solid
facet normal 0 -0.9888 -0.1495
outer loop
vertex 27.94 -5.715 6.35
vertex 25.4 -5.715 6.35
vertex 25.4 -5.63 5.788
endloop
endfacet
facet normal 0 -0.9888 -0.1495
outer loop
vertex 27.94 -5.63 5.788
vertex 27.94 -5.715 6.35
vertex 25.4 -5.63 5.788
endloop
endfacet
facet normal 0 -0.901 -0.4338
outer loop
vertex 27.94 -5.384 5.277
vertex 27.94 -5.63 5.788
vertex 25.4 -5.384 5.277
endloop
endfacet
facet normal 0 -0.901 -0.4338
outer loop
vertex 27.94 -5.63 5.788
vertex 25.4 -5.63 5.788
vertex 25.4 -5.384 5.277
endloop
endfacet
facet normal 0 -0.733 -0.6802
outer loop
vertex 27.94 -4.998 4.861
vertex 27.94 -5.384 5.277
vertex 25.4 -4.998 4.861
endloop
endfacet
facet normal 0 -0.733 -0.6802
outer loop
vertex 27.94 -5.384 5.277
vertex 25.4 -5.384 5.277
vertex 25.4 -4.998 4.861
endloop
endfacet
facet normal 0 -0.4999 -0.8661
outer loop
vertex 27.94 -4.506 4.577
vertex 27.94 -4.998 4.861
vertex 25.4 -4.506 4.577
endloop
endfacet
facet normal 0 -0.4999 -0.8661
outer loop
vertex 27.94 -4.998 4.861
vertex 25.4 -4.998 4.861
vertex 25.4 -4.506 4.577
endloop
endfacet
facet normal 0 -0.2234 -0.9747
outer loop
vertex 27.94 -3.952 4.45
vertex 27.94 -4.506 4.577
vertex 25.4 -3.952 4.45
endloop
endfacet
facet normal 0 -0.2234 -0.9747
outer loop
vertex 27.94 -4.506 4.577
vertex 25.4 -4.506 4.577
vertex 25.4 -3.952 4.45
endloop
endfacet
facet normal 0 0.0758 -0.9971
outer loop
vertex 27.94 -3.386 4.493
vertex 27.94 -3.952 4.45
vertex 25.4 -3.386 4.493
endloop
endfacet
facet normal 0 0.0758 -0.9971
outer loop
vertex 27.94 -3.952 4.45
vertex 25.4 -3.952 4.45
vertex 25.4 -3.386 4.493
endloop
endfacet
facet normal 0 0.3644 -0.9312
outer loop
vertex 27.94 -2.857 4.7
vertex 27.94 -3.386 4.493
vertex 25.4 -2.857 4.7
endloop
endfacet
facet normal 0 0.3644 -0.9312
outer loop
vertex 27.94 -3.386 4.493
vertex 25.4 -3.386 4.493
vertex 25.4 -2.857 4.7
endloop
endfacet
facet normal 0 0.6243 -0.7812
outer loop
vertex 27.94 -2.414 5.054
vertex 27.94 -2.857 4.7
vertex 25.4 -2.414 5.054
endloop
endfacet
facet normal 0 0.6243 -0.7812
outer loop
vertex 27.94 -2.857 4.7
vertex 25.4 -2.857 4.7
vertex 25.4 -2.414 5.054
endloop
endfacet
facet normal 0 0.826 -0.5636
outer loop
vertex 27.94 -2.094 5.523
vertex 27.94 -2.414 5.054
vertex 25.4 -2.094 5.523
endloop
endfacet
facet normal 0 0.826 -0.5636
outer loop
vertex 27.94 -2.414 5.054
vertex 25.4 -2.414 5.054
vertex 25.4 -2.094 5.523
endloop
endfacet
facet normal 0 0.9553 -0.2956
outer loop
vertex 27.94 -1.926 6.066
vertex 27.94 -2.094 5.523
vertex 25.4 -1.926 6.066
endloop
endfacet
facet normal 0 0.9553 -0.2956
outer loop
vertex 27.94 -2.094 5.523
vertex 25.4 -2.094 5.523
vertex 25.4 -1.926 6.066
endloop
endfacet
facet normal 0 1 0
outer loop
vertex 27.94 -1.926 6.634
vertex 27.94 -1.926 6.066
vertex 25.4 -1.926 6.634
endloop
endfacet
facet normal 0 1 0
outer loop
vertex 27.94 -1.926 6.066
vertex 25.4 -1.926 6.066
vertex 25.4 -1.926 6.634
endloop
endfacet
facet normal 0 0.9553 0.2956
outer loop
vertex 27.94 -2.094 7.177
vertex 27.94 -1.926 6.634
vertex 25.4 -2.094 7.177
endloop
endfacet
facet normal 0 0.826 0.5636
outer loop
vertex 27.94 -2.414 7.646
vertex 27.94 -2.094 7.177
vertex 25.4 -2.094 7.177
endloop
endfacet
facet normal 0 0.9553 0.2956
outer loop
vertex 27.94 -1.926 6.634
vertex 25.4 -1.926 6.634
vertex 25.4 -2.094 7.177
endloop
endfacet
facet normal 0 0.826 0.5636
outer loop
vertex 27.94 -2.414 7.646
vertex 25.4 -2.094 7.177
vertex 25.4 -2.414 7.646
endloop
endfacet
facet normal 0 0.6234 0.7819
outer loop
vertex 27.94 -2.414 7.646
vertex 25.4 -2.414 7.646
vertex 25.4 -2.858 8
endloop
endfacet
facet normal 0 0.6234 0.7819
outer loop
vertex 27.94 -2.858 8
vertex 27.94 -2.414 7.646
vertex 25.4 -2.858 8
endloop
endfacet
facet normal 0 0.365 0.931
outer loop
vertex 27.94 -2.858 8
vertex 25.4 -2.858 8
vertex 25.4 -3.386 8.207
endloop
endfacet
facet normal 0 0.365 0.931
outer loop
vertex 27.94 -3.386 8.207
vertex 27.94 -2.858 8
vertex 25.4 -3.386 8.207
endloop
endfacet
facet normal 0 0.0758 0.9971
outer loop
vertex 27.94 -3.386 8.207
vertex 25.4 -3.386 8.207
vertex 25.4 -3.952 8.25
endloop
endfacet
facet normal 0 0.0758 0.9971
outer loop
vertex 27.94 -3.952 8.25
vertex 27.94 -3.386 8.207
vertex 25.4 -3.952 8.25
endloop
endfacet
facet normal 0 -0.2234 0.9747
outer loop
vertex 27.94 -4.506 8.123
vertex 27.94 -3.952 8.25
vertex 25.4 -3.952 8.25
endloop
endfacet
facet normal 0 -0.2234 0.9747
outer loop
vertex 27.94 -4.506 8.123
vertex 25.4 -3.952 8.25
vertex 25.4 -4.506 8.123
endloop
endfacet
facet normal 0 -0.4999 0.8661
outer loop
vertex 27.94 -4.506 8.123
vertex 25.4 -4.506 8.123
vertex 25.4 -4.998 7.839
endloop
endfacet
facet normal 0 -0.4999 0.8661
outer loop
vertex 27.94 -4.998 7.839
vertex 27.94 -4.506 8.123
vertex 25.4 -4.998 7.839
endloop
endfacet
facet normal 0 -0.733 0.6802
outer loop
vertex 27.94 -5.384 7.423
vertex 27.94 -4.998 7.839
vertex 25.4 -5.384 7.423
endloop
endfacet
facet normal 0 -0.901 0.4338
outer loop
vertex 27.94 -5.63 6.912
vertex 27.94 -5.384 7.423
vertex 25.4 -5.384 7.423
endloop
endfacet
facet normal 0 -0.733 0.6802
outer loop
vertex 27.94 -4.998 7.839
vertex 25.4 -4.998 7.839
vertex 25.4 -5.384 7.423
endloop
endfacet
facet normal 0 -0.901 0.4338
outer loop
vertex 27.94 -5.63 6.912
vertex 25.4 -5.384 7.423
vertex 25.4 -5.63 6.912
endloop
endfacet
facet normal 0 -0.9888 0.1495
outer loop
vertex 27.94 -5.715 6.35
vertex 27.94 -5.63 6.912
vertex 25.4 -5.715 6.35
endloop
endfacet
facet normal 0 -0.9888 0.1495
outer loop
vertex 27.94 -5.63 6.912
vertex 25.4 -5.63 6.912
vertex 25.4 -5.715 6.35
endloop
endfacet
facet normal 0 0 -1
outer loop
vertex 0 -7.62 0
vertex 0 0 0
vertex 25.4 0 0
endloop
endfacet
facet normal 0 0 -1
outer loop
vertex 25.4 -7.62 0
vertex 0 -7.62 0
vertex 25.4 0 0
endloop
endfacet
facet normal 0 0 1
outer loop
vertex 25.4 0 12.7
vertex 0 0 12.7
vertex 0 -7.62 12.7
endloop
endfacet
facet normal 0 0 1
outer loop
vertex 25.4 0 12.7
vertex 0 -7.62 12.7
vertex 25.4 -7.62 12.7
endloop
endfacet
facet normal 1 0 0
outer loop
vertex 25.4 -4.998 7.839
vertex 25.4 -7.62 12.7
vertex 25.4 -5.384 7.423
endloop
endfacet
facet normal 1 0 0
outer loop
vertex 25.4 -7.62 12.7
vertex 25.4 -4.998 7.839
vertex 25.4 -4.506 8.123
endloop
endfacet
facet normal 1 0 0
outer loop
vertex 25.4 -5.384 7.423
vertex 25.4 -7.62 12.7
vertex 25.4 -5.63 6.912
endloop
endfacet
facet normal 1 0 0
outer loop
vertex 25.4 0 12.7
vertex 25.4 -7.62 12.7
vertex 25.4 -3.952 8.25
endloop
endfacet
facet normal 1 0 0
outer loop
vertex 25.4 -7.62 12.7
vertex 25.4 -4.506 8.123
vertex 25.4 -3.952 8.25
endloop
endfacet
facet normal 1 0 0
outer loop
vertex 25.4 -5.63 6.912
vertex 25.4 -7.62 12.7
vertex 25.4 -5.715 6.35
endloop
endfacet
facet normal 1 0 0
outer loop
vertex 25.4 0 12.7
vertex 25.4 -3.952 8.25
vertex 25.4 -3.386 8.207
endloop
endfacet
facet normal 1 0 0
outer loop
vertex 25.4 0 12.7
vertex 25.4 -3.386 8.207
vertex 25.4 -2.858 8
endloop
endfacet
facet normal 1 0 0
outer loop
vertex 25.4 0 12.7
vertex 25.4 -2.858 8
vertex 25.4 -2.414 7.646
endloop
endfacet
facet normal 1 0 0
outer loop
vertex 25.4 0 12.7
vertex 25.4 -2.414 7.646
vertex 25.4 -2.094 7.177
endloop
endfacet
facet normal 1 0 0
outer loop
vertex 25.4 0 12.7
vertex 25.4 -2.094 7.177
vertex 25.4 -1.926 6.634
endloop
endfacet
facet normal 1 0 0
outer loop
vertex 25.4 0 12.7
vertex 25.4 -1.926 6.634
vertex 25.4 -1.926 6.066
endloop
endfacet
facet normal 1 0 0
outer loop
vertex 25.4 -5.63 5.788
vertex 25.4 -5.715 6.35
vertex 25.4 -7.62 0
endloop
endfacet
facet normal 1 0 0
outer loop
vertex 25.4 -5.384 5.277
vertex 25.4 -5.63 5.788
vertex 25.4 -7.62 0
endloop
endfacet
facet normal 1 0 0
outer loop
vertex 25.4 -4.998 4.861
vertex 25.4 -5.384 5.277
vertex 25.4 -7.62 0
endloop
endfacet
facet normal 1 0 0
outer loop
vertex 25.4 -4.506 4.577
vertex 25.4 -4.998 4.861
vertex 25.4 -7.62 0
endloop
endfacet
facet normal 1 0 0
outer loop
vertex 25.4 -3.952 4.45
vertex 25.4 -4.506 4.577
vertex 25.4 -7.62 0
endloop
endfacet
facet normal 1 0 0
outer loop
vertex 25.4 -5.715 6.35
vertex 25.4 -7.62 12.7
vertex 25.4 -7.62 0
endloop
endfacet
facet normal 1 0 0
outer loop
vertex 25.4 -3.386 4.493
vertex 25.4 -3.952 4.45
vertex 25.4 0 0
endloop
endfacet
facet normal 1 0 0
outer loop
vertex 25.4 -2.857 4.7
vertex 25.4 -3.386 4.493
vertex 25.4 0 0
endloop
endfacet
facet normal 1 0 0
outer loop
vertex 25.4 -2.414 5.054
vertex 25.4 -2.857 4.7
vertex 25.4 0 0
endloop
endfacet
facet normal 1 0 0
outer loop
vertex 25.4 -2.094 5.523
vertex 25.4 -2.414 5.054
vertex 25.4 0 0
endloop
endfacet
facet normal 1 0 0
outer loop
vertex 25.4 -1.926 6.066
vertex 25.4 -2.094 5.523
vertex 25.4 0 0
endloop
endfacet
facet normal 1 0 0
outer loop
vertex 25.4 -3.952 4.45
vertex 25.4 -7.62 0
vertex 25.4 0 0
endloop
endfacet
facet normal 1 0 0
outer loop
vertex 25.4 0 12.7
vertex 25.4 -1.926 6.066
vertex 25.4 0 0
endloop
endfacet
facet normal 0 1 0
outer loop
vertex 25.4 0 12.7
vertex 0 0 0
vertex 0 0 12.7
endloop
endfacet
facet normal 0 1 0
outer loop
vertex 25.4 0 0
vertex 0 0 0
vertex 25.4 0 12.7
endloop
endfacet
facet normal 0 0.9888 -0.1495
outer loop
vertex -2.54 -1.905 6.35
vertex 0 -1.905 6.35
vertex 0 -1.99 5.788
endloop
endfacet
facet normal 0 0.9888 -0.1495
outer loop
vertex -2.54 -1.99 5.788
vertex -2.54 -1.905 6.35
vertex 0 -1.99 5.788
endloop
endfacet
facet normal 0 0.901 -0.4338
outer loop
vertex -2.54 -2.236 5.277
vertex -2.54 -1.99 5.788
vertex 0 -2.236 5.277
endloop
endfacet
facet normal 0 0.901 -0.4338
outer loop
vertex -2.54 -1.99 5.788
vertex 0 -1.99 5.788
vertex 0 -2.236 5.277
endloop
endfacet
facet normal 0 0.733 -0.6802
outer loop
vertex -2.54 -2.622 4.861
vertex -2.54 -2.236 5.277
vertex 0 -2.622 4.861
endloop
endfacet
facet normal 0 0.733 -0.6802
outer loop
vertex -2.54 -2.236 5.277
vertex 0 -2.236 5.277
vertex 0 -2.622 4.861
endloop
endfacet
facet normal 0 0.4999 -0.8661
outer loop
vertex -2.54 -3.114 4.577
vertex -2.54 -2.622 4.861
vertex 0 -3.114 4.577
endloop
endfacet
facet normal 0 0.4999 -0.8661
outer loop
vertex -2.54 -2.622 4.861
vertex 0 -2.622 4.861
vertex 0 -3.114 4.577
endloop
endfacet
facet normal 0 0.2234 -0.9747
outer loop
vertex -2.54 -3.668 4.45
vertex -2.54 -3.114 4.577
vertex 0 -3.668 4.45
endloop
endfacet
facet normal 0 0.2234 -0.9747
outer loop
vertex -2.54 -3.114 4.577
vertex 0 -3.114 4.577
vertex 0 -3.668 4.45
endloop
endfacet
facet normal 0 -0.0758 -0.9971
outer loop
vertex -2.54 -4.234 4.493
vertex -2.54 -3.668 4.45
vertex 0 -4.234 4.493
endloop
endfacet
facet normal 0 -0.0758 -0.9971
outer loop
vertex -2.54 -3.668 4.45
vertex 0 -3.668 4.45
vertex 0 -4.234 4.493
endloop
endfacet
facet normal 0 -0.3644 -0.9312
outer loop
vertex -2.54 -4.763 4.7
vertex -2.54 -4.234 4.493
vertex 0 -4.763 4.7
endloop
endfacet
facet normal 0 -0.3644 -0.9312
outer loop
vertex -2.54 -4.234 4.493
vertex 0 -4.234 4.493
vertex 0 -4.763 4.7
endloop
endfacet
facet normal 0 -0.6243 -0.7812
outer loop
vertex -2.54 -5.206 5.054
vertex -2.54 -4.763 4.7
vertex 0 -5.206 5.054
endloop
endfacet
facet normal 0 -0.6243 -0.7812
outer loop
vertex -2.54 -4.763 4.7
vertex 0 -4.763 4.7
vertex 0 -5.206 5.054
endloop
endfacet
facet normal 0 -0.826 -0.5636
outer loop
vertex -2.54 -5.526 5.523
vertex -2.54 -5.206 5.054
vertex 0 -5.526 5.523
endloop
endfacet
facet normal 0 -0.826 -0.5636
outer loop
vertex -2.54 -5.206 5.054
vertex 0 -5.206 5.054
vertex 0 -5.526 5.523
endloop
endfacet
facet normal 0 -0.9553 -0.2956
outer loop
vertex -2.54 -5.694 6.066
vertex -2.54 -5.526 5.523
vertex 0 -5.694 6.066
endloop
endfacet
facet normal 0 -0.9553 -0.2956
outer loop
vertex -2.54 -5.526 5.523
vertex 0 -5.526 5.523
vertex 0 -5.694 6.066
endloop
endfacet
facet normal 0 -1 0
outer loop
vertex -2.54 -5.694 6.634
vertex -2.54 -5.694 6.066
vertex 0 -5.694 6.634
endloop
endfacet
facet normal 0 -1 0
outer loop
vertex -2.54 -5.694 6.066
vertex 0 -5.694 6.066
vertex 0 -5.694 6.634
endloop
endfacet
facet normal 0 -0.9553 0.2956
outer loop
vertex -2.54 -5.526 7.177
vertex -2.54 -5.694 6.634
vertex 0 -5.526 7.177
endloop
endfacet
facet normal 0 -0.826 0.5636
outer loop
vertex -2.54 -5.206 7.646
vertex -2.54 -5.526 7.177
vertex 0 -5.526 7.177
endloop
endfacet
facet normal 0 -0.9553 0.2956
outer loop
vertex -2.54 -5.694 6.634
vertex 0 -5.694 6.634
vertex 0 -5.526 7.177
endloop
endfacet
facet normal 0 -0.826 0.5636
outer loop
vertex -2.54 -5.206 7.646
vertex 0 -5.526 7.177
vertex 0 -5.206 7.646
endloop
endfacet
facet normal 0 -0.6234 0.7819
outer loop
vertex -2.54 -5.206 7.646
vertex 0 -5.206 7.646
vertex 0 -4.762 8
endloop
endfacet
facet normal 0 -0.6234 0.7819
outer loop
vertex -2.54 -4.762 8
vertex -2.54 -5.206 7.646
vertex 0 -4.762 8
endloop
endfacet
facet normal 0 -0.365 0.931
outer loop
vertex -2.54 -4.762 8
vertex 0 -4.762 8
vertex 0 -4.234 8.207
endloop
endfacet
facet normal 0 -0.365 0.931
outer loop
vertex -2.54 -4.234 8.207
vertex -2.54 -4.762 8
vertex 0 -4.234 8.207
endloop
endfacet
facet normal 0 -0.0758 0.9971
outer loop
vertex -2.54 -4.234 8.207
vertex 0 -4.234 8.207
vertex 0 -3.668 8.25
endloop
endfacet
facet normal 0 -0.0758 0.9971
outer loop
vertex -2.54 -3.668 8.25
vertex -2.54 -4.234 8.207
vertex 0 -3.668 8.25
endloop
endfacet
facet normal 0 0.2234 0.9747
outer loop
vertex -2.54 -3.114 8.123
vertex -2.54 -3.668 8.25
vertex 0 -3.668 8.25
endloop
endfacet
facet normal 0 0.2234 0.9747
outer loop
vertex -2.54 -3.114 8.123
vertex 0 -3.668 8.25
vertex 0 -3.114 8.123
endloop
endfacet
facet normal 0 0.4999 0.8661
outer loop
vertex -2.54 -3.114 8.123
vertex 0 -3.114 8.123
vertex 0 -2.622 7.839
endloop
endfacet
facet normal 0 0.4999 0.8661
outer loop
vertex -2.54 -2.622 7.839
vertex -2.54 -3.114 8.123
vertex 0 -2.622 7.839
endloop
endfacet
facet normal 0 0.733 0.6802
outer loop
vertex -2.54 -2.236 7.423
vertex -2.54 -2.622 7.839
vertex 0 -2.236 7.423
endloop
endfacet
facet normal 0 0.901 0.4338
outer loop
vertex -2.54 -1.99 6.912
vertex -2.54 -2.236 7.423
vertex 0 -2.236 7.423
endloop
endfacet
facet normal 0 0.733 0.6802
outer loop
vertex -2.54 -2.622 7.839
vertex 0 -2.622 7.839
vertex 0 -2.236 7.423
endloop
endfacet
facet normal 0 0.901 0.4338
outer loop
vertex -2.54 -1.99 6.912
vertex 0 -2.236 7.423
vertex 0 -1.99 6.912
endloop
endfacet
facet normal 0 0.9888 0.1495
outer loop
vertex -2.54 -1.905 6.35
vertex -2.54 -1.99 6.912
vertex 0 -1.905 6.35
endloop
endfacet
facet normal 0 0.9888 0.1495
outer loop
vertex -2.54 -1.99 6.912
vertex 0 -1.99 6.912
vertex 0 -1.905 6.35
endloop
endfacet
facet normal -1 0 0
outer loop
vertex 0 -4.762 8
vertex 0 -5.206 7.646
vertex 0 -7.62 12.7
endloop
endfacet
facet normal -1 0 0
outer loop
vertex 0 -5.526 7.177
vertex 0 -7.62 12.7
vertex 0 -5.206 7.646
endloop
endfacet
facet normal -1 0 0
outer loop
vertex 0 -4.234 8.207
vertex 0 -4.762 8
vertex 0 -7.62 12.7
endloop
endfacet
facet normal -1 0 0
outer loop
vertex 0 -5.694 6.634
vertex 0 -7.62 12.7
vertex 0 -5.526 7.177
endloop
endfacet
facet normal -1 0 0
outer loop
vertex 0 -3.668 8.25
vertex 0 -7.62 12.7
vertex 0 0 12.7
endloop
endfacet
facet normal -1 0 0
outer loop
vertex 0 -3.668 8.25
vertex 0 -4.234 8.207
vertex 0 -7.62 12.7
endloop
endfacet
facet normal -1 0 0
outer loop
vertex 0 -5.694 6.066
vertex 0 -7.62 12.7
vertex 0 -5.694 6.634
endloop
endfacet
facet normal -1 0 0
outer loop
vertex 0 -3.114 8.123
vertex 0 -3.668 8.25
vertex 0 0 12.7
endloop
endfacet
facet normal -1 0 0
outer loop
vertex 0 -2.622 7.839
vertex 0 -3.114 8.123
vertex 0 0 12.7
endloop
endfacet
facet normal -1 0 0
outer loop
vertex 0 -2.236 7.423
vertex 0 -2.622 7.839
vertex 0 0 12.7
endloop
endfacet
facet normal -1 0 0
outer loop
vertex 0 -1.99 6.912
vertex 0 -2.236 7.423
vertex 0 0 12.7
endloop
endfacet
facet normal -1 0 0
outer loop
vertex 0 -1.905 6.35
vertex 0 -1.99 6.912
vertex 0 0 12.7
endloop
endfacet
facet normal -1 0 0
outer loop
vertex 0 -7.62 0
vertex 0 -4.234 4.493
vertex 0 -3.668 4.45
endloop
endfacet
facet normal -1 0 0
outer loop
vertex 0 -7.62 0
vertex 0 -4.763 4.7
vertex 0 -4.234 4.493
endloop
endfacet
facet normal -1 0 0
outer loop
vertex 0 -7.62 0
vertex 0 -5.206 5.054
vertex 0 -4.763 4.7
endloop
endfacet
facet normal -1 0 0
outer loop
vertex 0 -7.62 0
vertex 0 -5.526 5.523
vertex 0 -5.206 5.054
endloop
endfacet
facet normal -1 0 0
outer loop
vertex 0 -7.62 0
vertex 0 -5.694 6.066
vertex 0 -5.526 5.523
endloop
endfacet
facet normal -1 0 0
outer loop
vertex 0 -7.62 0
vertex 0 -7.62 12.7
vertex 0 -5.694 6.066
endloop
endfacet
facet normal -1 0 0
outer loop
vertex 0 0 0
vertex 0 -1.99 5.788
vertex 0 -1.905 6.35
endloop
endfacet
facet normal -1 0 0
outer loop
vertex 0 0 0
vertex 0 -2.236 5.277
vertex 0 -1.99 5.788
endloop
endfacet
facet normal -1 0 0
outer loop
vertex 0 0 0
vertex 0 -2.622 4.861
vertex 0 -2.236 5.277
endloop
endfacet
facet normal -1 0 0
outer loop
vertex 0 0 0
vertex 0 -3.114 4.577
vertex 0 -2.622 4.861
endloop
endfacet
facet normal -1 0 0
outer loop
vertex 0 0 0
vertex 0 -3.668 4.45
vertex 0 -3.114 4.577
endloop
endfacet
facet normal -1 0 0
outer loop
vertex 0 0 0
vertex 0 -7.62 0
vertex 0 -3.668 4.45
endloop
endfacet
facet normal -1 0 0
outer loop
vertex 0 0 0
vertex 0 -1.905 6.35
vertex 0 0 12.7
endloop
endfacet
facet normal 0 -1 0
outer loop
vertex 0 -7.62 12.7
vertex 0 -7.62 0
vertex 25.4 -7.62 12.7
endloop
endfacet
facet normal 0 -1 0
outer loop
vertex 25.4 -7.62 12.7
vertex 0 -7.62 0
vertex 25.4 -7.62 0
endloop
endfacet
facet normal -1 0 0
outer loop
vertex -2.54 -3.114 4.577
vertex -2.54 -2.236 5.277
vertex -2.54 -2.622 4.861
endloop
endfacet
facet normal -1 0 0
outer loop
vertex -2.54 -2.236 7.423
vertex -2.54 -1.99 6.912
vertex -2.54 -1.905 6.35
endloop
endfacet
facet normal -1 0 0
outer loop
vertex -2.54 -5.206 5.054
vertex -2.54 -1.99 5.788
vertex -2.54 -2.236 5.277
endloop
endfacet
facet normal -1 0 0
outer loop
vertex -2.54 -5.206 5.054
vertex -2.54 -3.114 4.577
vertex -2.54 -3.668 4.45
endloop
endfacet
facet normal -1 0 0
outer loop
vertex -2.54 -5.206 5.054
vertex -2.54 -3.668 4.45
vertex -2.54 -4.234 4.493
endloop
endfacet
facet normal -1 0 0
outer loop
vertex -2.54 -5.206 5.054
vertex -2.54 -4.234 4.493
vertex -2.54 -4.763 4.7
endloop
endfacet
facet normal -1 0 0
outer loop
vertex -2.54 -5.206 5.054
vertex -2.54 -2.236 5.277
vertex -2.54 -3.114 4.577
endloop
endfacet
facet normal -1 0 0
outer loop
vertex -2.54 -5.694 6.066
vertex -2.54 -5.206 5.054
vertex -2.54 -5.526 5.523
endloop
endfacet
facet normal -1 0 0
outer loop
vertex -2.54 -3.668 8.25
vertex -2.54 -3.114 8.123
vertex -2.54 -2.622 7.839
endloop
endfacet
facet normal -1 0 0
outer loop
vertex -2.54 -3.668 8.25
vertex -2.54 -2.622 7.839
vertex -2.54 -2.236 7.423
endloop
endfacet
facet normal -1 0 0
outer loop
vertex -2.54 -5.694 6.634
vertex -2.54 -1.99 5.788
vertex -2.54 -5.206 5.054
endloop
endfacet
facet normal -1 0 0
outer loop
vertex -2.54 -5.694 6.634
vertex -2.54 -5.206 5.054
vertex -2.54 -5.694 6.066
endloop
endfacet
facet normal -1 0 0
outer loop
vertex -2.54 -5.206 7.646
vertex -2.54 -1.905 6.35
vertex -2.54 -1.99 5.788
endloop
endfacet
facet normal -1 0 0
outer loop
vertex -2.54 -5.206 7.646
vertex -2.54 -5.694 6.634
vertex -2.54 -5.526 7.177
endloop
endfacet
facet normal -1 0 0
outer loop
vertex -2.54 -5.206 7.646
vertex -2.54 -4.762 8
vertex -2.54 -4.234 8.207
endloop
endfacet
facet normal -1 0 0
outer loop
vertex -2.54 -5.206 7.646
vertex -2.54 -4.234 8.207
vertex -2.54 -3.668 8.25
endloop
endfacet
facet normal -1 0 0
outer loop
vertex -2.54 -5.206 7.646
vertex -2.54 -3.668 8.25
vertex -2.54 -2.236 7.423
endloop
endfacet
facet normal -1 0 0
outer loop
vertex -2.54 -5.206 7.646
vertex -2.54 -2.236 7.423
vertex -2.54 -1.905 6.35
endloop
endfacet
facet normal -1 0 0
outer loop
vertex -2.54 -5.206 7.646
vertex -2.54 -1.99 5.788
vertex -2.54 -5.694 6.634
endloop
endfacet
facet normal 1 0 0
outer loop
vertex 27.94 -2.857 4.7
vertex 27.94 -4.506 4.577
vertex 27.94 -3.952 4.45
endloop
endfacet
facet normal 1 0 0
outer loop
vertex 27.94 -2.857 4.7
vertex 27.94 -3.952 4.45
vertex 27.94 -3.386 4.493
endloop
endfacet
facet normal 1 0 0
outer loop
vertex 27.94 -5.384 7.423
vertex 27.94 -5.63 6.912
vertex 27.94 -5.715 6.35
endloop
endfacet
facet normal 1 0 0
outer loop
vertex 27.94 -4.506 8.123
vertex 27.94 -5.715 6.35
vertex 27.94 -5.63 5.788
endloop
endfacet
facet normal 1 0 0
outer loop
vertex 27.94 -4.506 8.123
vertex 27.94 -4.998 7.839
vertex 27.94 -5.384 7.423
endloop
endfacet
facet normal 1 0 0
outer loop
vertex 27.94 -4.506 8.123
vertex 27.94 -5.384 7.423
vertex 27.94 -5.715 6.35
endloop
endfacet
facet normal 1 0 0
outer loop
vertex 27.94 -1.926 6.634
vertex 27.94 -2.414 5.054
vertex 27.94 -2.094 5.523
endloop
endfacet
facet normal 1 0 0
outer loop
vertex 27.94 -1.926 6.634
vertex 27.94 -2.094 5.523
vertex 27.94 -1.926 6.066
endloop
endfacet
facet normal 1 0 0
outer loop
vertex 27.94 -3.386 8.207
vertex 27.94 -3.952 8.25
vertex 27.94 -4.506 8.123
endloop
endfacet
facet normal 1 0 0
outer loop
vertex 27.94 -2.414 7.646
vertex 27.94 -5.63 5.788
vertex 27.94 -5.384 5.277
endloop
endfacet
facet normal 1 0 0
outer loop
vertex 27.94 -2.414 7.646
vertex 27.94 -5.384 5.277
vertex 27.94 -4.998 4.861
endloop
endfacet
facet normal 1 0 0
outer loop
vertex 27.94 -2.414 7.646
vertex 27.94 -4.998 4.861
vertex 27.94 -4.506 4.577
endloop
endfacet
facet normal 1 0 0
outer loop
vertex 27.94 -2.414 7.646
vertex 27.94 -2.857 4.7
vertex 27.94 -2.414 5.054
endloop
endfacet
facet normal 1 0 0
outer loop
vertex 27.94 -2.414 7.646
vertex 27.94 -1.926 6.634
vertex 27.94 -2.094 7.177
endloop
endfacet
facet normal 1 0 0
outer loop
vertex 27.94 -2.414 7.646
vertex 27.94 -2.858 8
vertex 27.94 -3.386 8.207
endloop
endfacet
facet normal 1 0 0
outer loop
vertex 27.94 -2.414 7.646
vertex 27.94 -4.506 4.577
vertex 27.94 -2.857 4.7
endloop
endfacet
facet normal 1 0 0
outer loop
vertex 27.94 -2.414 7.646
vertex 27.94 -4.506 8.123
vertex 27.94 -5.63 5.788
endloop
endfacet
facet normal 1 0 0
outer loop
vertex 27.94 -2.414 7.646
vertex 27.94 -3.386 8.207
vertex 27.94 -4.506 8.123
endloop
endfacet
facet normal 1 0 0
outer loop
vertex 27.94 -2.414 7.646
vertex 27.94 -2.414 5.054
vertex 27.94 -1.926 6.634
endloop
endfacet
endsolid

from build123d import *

# Parameters (mm, degrees)
F0_W     = 25.4
F0_H     = 7.62
F1_DEPTH = 12.7
F3_DEPTH = 2.54
F5_DEPTH = 2.54


with BuildPart() as f1:
    # F0 (on Top) → F1 (new body)
    with BuildSketch(Plane.XY):
        with Locations((12.7, -3.81)):
            Rectangle(F0_W, F0_H)
    extrude(amount=F1_DEPTH)

    # F2 (on face) → F3 (join)
    with BuildSketch(Plane.YZ.offset(25.4)):
        with BuildLine():
            Line((-5.715, 6.35), (-3.81, 6.35))
            Line((-3.81, 6.35), (-1.905, 6.35))
            ThreePointArc((-1.905, 6.35), (-3.81, 8.255), (-5.715, 6.35))
        make_face()
        with BuildLine():
            Line((-1.905, 6.35), (-3.81, 6.35))
            Line((-3.81, 6.35), (-5.715, 6.35))
            ThreePointArc((-5.715, 6.35), (-3.81, 4.445), (-1.905, 6.35))
        make_face()
    extrude(amount=F3_DEPTH)

    # F4 (on face) → F5 (join)
    with BuildSketch(Plane(origin=(0, 0, 0), x_dir=(0, -1, 0), z_dir=(-1, 0, 0))):
        with BuildLine():
            Line((1.905, 6.35), (3.81, 6.35))
            Line((3.81, 6.35), (5.715, 6.35))
            ThreePointArc((5.715, 6.35), (3.81, 8.255), (1.905, 6.35))
        make_face()
        with BuildLine():
            Line((5.715, 6.35), (3.81, 6.35))
            Line((3.81, 6.35), (1.905, 6.35))
            ThreePointArc((1.905, 6.35), (3.81, 4.445), (5.715, 6.35))
        make_face()
    extrude(amount=F5_DEPTH)


solid = f1.part
